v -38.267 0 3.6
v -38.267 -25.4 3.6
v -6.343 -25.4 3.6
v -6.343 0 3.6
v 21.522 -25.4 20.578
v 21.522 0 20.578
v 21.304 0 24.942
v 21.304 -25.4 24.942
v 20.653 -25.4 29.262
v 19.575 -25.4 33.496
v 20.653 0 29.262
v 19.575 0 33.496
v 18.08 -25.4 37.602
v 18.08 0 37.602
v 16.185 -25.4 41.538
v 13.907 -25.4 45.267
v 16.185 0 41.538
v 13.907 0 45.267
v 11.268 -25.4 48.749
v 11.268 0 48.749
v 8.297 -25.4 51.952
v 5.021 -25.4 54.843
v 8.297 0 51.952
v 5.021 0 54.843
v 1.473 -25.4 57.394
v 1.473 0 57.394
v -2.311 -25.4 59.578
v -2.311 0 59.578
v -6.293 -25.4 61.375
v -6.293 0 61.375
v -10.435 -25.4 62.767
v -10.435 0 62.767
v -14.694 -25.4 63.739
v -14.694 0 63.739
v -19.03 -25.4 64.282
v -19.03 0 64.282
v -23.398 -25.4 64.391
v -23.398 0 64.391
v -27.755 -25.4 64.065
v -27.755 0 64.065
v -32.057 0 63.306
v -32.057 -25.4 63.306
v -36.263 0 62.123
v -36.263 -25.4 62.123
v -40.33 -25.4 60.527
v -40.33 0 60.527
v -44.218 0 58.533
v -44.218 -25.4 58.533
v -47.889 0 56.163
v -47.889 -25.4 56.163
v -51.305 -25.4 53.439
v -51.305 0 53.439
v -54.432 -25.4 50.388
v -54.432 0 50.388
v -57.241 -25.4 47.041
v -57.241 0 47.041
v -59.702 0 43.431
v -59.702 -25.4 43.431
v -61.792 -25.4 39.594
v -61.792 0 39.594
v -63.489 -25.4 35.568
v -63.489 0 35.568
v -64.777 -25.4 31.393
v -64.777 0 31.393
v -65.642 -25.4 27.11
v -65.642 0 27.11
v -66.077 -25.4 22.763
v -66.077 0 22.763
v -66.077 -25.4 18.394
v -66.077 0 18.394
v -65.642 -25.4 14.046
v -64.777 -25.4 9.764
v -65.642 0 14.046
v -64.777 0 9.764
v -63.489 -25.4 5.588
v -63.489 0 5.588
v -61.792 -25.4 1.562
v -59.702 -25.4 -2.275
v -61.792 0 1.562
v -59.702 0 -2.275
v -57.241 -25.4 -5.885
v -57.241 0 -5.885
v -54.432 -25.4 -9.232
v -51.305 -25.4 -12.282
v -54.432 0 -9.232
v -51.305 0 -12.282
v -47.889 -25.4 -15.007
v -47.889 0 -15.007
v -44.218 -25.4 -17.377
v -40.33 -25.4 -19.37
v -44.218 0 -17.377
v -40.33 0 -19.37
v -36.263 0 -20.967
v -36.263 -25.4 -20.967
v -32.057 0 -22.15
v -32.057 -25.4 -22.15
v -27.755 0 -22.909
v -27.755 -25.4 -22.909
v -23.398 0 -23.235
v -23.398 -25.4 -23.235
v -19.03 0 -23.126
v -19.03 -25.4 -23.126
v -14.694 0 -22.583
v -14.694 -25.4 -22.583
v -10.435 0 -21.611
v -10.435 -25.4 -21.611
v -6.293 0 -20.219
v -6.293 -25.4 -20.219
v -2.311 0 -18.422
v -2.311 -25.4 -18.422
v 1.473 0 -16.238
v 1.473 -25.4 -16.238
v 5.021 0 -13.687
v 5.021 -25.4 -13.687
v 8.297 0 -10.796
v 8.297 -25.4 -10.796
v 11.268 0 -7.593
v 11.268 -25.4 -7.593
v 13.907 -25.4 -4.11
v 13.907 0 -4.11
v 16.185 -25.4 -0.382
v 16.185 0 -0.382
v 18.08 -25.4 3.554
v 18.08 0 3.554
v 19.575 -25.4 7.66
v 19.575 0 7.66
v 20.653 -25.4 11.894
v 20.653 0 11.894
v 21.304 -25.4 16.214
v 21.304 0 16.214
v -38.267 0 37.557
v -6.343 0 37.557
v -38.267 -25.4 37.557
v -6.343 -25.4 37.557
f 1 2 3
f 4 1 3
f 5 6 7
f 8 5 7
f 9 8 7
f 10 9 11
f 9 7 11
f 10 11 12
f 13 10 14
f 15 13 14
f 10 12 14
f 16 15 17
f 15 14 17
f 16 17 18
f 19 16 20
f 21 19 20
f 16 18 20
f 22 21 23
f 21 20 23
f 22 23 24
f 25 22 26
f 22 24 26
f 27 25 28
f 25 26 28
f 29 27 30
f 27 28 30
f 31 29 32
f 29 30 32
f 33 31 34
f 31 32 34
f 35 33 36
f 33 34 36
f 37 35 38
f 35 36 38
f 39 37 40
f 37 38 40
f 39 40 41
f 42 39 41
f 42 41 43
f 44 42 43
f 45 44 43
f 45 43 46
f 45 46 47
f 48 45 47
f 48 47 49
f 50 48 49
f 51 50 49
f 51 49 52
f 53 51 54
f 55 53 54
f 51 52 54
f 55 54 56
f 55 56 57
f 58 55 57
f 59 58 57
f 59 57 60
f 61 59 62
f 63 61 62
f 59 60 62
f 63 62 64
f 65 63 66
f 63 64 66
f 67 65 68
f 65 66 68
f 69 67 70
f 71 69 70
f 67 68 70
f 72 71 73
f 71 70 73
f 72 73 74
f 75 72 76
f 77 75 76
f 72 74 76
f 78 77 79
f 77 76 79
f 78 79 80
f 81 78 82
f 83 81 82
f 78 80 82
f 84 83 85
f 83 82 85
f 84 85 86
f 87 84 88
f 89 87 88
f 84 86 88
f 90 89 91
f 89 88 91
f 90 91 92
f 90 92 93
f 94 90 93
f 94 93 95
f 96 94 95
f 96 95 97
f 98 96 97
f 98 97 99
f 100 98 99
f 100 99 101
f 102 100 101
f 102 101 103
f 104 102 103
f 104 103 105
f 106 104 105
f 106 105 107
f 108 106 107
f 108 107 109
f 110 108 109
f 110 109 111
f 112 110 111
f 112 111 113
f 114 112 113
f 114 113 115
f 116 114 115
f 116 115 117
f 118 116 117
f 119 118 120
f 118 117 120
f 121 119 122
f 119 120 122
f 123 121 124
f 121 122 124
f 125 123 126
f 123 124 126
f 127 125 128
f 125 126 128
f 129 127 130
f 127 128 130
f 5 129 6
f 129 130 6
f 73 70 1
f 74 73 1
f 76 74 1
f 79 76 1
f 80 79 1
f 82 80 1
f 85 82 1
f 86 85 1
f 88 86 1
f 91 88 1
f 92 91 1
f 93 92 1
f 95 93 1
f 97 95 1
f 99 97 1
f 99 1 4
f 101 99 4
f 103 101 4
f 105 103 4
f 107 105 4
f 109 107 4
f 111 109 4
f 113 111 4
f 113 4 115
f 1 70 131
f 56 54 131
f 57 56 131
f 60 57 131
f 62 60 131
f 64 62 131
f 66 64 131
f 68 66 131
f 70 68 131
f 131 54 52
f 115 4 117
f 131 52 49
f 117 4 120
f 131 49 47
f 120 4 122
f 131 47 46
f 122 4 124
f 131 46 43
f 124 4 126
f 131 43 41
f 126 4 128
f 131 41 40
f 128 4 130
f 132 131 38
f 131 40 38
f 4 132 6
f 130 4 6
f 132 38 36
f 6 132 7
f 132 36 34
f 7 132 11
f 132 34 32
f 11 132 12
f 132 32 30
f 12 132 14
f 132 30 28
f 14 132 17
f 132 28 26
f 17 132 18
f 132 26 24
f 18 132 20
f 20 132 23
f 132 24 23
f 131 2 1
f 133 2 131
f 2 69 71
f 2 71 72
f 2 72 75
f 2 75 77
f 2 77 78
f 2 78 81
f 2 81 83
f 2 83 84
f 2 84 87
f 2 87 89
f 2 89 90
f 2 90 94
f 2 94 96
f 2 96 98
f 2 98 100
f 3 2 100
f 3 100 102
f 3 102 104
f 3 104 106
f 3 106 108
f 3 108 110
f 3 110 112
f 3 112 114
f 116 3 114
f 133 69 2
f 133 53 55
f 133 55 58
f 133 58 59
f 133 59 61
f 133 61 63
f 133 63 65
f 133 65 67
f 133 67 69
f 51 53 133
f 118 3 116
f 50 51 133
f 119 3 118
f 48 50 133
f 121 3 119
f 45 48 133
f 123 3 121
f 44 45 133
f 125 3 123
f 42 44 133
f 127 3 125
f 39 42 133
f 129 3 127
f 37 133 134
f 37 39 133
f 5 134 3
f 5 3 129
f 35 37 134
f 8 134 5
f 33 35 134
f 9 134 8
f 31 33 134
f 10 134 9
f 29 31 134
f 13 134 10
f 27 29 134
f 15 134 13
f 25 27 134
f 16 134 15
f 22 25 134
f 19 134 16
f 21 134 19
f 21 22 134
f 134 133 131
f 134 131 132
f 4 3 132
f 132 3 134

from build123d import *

# Parameters (mm, degrees)
F0_R     = 43.826874
F1_DEPTH = 25.4
F2_W     = 31.924735
F2_H     = 33.95685
F3_DEPTH = 25.4


with BuildPart() as f1:
    # F0 (on Front) → F1 (new body)
    with BuildSketch(Plane.XZ):
        with Locations((-22.304947, 20.578112)):
            Circle(F0_R)
    extrude(amount=F1_DEPTH)

    # F2 (on face) → F3 (cut)
    with BuildSketch(Plane.XZ.offset(25.4)):
        with Locations((-22.304946, 20.578112)):
            Rectangle(F2_W, F2_H)
    extrude(amount=-F3_DEPTH, mode=Mode.SUBTRACT)


solid = f1.part
